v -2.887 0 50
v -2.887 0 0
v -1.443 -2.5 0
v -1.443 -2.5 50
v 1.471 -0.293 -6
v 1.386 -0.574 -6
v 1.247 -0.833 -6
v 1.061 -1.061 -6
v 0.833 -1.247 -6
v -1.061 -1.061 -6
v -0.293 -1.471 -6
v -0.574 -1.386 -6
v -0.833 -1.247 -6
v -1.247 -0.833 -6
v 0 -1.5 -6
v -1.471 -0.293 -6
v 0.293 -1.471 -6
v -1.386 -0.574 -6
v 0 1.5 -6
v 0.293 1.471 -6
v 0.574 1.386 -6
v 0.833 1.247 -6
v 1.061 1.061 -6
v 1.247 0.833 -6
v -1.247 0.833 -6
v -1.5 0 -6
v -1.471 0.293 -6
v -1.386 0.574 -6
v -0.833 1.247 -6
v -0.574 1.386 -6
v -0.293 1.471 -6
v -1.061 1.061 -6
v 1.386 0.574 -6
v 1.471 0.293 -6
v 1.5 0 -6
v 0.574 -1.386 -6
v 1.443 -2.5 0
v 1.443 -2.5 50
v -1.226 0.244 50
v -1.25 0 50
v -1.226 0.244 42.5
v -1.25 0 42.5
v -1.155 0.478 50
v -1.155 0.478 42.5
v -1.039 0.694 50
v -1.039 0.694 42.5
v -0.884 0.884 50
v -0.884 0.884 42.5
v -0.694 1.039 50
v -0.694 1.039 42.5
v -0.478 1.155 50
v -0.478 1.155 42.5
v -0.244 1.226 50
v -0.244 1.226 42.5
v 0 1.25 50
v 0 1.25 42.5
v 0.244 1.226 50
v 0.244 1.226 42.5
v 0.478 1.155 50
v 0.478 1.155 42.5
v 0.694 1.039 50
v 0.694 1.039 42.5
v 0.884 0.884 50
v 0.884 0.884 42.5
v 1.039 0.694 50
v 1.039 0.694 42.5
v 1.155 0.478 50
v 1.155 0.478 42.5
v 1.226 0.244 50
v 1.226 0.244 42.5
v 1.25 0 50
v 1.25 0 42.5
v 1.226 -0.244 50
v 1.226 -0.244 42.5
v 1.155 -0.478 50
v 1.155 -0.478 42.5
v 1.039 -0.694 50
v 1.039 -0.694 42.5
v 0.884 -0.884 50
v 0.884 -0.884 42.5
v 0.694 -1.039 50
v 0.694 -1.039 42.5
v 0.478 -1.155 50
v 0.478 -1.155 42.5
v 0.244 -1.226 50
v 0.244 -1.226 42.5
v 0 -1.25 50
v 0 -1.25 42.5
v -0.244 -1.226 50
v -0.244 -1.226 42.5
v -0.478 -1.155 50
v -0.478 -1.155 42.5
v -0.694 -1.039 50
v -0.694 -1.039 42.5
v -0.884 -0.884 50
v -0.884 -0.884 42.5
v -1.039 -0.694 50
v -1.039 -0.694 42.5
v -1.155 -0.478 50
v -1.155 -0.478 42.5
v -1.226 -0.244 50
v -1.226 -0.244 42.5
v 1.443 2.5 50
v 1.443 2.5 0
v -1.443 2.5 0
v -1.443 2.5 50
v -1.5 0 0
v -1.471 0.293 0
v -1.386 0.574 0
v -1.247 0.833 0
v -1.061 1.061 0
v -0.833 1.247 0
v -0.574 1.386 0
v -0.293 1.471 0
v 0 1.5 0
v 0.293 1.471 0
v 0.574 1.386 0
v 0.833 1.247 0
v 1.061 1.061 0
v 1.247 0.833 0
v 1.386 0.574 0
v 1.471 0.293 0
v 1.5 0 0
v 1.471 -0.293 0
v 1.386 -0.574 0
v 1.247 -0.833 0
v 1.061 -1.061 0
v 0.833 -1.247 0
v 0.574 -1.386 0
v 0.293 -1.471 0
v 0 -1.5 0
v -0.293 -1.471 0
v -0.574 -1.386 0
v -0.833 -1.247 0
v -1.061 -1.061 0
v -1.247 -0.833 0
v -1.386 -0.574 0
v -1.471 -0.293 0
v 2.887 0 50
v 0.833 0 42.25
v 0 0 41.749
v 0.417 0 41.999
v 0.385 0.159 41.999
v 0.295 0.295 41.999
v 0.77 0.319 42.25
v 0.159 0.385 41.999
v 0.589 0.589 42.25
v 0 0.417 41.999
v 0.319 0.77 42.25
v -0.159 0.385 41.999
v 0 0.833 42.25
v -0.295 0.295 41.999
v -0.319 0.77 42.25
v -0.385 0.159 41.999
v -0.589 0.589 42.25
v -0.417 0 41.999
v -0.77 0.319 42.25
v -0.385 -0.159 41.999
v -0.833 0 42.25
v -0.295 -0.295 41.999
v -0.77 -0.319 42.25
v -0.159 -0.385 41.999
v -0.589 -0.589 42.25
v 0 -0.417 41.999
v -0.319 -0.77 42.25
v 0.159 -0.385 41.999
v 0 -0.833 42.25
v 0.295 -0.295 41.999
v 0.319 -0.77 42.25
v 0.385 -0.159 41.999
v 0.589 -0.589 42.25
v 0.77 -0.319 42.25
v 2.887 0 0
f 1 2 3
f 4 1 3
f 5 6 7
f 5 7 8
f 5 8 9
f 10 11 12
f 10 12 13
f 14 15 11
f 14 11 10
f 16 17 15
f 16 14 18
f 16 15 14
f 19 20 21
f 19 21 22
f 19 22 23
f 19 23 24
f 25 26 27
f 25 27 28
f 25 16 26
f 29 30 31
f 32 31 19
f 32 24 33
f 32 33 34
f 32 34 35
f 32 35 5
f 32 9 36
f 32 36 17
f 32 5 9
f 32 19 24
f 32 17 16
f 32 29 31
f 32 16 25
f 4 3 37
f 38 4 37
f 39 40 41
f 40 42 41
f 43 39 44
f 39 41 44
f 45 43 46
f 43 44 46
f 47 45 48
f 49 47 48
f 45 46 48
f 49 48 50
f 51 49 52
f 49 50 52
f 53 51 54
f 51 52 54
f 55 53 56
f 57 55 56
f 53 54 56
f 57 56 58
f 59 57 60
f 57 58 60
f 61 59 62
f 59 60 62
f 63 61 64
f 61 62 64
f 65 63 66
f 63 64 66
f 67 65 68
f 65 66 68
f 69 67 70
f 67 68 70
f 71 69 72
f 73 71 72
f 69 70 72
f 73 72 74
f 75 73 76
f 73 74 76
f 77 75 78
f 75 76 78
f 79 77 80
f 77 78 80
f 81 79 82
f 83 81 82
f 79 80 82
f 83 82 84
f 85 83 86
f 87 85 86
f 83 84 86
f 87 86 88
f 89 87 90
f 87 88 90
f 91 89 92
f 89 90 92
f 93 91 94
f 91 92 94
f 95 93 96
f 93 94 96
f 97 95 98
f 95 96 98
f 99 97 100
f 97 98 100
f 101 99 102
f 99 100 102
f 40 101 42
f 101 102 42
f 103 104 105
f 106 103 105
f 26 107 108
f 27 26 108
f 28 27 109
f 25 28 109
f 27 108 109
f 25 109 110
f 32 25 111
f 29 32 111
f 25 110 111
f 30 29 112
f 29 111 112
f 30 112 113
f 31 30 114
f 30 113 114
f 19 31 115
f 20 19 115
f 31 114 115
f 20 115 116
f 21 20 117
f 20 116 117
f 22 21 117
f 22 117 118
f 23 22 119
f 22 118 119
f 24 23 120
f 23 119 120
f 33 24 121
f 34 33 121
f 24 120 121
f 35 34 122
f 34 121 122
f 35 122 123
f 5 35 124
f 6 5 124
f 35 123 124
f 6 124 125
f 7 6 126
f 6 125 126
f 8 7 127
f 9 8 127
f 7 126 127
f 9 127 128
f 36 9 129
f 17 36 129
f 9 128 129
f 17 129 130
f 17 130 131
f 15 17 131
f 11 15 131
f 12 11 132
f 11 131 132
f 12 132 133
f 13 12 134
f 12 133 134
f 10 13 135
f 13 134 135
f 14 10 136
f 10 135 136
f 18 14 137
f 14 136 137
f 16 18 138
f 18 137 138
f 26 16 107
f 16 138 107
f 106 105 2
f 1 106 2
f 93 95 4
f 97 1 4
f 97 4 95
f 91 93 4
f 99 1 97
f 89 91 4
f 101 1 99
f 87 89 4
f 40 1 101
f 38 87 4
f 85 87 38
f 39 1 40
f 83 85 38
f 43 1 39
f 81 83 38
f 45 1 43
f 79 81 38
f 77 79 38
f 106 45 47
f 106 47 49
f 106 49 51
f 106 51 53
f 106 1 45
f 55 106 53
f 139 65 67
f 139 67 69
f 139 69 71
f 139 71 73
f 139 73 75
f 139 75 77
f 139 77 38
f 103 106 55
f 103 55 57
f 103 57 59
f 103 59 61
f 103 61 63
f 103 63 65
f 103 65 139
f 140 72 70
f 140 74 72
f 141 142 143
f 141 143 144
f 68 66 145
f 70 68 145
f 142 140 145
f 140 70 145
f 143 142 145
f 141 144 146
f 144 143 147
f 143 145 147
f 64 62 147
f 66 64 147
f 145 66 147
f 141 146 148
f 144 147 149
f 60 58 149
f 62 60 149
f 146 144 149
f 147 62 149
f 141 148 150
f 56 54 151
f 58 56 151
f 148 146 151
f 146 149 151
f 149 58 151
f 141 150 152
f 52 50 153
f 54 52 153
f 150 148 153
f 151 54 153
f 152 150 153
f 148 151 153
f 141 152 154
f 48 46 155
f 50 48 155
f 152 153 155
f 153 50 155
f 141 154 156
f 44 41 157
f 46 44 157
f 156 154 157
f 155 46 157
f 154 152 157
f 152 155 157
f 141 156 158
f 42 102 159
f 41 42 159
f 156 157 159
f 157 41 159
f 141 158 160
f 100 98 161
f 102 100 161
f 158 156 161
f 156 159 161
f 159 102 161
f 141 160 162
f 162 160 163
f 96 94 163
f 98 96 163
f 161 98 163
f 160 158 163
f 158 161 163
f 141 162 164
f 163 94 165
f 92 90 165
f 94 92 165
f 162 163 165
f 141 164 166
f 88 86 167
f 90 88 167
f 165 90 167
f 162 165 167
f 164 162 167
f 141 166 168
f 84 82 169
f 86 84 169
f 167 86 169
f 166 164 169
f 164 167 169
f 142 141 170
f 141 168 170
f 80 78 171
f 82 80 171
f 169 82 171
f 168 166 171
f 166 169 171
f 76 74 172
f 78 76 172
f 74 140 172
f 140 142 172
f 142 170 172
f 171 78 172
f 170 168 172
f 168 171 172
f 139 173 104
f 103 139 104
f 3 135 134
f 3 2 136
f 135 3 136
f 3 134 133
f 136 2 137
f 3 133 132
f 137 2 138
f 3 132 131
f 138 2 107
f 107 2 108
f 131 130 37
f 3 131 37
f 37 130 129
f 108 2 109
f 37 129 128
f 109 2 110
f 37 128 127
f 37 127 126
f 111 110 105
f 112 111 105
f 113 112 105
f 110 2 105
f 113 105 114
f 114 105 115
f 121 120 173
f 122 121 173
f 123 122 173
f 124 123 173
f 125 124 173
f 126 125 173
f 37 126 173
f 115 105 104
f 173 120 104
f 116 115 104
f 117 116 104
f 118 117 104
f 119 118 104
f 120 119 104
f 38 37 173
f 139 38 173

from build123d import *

# Parameters (mm, degrees)
EXTRUDE_1_DEPTH = 50
SKETCH_4_R      = 1.5
EXTRUDE_2_DEPTH = 6
M3X0_5_1_D      = 2.5
M3X0_5_1_DEPTH  = 7.5
M3X0_5_1_TIP    = 0.751075774


with BuildPart() as part:
    # 草圖1 → 填料-伸長1 (new body)
    with BuildSketch(Plane.XY):
        Polygon((-1.443375673, 2.5), (-2.886751346, 0), (-1.443375673, -2.5), (1.443375673, -2.5), (2.886751346, 0), (1.443375673, 2.5), align=None)
    extrude(amount=EXTRUDE_1_DEPTH)

    # 草圖4 → 填料-伸長2 (add)
    with BuildSketch(Plane(origin=(0, 0, 0), x_dir=(-1, 0, 0), z_dir=(0, 0, -1))):
        Circle(SKETCH_4_R)
    extrude(amount=EXTRUDE_2_DEPTH)

    # M3x0.5 螺紋孔1
    with Locations(Plane.XY.offset(50)):
        with Locations((0, 0)):
            Hole(M3X0_5_1_D / 2, depth=M3X0_5_1_DEPTH)
            with Locations((0, 0, -(M3X0_5_1_DEPTH + M3X0_5_1_TIP / 2))):  # 118° drill point
                Cone(0, M3X0_5_1_D / 2, M3X0_5_1_TIP, mode=Mode.SUBTRACT)


solid = part.part
